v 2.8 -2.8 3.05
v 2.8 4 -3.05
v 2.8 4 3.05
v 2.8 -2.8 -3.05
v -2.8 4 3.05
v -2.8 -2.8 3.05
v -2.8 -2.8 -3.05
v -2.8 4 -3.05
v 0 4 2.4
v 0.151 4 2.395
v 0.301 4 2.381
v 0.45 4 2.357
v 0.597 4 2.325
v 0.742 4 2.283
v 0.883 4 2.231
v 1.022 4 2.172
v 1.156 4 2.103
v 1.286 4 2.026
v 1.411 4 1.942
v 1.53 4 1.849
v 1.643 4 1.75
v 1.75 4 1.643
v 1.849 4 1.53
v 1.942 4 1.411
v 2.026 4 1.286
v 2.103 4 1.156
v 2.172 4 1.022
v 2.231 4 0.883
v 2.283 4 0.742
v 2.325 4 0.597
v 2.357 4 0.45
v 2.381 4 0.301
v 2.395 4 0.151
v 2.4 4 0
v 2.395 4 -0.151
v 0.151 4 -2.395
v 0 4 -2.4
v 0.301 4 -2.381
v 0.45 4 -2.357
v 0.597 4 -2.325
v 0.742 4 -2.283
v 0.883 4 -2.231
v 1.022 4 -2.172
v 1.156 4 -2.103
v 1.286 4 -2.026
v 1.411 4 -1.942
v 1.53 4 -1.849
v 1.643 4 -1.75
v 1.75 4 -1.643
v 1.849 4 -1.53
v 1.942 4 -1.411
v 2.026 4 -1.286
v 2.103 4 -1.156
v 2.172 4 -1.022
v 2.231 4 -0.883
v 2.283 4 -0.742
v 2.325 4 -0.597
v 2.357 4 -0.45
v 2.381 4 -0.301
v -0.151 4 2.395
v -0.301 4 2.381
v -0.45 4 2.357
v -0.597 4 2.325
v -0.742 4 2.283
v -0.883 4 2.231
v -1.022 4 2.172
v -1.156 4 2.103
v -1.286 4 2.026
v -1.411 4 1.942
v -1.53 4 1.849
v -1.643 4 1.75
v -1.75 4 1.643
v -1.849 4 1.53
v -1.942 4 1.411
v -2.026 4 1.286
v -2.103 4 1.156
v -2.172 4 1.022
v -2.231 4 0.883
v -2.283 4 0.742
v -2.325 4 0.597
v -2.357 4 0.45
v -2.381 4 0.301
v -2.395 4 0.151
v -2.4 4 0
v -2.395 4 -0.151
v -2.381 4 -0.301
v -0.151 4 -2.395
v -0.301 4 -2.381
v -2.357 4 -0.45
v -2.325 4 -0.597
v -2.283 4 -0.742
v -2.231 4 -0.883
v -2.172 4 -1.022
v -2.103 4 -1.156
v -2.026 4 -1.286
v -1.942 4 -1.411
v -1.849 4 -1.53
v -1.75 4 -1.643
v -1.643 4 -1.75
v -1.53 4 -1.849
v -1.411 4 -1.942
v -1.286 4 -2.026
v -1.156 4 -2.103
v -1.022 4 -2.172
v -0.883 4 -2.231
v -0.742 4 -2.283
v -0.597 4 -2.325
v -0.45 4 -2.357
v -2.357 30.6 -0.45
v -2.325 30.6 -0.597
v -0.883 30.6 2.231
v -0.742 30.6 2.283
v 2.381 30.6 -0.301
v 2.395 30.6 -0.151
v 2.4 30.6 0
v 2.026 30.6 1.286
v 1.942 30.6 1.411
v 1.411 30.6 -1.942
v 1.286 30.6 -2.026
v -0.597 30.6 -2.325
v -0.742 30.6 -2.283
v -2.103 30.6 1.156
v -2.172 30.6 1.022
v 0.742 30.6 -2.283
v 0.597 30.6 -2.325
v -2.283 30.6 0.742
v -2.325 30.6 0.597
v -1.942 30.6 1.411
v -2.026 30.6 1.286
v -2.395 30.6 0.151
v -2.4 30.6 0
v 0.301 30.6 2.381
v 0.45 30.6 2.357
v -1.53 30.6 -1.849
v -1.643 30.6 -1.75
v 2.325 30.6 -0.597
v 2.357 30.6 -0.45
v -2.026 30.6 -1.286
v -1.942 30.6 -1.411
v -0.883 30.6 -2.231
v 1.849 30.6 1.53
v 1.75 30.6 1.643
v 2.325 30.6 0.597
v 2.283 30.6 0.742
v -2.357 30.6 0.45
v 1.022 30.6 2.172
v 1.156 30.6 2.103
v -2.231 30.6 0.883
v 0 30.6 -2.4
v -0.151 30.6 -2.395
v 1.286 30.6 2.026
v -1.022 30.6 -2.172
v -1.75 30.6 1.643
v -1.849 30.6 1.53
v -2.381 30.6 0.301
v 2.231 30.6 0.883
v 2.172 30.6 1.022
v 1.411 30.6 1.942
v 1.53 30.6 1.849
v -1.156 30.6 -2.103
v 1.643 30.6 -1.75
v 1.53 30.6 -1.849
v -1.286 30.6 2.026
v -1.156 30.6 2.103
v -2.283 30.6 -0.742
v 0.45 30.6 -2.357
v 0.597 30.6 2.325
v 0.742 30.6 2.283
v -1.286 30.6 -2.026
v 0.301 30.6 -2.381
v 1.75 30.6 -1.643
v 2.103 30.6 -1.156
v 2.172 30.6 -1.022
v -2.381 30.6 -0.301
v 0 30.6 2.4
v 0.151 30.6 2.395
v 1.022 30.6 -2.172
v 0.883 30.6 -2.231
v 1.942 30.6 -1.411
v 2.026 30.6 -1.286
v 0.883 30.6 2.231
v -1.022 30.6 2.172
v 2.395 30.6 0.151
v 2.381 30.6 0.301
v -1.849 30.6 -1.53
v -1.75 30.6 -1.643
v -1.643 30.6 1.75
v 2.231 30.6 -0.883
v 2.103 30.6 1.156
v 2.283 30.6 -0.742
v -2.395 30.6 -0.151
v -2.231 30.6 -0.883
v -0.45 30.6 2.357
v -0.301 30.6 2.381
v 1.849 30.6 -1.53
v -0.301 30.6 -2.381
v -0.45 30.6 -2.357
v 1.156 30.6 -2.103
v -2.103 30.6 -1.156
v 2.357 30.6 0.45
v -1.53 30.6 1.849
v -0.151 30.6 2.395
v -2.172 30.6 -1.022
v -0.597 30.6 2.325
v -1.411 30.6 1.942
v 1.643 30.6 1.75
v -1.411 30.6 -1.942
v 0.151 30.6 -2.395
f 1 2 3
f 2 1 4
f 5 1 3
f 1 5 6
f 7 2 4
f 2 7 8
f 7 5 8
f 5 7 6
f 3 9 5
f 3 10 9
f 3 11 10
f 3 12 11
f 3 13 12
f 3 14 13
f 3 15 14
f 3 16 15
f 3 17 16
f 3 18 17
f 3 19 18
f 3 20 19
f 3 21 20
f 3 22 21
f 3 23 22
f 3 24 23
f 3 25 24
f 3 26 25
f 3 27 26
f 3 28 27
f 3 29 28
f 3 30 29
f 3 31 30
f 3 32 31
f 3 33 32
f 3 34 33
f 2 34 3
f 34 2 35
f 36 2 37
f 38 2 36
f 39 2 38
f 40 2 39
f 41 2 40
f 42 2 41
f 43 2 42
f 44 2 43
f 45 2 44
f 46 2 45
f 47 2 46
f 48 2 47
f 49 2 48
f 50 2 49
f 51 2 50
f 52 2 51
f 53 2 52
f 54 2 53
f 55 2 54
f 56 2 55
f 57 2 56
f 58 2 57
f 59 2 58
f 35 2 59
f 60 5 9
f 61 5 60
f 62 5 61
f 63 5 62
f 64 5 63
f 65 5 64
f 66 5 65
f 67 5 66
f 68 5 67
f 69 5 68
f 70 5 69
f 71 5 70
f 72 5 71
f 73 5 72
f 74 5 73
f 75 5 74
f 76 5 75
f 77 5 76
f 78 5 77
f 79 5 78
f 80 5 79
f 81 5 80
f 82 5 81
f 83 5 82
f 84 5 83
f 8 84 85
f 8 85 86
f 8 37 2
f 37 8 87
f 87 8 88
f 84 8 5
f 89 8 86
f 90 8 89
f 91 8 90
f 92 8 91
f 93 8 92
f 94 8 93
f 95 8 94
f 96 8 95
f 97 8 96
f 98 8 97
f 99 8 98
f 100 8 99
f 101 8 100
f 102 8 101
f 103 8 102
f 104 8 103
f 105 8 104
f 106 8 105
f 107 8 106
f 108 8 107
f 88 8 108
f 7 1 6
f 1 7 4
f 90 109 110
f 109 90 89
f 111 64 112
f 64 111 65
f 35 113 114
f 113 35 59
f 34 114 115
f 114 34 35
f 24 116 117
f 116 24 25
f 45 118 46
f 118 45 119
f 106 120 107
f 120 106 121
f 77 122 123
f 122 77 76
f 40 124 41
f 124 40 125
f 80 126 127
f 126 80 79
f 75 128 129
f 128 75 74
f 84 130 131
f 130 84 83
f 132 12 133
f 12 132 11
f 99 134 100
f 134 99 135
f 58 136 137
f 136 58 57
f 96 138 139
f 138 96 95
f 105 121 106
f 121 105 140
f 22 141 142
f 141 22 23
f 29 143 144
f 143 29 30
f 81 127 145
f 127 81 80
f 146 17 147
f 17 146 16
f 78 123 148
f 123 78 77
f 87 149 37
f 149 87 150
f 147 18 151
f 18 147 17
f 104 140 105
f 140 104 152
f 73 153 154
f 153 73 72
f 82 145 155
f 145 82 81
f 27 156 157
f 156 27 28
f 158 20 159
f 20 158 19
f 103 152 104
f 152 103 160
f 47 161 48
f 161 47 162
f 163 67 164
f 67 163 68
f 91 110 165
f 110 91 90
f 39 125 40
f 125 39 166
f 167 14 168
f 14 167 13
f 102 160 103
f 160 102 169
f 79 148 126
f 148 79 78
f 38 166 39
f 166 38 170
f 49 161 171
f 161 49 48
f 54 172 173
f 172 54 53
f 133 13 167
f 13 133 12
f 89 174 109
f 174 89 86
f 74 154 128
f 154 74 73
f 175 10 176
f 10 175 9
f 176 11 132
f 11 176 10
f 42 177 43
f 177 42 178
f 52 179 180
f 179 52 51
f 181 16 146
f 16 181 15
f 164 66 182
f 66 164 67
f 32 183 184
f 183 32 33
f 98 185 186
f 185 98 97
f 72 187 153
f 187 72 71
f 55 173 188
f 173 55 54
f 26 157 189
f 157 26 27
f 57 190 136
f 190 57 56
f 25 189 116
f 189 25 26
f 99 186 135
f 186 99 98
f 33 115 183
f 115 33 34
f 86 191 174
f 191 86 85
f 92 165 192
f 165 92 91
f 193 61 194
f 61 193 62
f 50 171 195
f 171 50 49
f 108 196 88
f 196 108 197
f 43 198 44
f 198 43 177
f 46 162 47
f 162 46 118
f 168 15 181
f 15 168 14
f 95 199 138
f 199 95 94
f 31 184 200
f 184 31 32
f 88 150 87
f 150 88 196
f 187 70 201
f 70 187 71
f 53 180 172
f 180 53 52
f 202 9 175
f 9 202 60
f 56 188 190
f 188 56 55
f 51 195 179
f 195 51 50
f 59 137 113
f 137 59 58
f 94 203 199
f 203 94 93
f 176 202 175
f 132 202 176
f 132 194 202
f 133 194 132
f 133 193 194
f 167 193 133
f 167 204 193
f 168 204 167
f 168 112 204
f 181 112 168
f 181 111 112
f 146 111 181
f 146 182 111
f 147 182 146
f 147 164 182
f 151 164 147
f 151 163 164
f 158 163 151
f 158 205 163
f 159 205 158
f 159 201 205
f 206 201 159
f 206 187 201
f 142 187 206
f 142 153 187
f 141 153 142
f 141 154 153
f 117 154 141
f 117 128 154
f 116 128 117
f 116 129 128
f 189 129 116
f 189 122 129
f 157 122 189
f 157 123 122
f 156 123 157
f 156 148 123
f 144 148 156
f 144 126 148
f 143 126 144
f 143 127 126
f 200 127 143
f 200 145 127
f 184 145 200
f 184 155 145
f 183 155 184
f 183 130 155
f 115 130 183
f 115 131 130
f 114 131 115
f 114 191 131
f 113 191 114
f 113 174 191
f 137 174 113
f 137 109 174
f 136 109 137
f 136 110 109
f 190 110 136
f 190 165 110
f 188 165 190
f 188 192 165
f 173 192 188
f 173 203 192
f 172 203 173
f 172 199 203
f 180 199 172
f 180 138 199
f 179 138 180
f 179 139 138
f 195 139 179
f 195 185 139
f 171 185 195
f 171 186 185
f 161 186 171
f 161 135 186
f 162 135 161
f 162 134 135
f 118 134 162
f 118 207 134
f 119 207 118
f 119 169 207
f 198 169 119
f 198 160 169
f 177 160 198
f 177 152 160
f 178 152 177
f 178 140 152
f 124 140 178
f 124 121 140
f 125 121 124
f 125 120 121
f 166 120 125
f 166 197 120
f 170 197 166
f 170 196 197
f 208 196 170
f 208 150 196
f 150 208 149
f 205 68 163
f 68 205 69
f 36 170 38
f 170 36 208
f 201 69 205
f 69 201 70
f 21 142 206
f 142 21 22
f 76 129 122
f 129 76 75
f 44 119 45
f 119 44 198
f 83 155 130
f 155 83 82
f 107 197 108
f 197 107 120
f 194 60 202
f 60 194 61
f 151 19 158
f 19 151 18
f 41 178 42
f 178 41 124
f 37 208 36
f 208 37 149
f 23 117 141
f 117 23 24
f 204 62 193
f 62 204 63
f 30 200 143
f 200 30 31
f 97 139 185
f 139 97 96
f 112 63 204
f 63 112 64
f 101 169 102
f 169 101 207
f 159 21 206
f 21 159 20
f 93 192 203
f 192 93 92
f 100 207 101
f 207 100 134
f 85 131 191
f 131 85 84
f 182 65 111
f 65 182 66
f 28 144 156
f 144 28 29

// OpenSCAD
// file: params.scad
width = 6;
lower_length = 80;
upper_length = 70;
scale = 1/3;
axis_diam = 3;
hinge_inner = 10;
hinge_outer = 5;
slide_diam = 8;
slide_offset_vert = 10; // Vertical distans from gimbal center to the center of the guide ball
slide_offset_horiz = upper_length*scale + 4;// Horizontal distans from gimbal center to the center of the guide ball
upper_strut_dist = 16;
guide_thickness = 2;
screw_head_heigth = 3;
gap = 0.2;

cam_outer = 20;
cam_high_depth = 15;
cam_length = hinge_inner + hinge_outer*2 + width *2;
cam_axis_diam = 4;
cam_inset = 1;

center_dist = 45; // Distance from gimbal center to surface of center wall
axis_lock_length = 6.1;
axis_lock_outer_diam = 5.6;
//axis_lock_screw_dist = 10;
axis_lock_screw_head_diam = 4.8;
axis_lock_height = 6.8;
axis_lock_screw_depth = 30;
$fn=100;

v = [0,slide_offset_horiz, -slide_offset_vert];
vc = (slide_diam/2 + cam_high_depth) * [0, v[2], -v[1]] / norm(v) + v;
cam_center = vc;
// main file
include <params.scad>


module axis_lock()
{
  translate([0,(axis_lock_height - axis_lock_outer_diam)/2, 0]) {
    cube([axis_lock_outer_diam, axis_lock_height,axis_lock_length], center= true);
    rotate([-90,0,0]) {
      cylinder(d=axis_lock_screw_head_diam, h = axis_lock_screw_depth);
    }
  }

}

axis_lock();
